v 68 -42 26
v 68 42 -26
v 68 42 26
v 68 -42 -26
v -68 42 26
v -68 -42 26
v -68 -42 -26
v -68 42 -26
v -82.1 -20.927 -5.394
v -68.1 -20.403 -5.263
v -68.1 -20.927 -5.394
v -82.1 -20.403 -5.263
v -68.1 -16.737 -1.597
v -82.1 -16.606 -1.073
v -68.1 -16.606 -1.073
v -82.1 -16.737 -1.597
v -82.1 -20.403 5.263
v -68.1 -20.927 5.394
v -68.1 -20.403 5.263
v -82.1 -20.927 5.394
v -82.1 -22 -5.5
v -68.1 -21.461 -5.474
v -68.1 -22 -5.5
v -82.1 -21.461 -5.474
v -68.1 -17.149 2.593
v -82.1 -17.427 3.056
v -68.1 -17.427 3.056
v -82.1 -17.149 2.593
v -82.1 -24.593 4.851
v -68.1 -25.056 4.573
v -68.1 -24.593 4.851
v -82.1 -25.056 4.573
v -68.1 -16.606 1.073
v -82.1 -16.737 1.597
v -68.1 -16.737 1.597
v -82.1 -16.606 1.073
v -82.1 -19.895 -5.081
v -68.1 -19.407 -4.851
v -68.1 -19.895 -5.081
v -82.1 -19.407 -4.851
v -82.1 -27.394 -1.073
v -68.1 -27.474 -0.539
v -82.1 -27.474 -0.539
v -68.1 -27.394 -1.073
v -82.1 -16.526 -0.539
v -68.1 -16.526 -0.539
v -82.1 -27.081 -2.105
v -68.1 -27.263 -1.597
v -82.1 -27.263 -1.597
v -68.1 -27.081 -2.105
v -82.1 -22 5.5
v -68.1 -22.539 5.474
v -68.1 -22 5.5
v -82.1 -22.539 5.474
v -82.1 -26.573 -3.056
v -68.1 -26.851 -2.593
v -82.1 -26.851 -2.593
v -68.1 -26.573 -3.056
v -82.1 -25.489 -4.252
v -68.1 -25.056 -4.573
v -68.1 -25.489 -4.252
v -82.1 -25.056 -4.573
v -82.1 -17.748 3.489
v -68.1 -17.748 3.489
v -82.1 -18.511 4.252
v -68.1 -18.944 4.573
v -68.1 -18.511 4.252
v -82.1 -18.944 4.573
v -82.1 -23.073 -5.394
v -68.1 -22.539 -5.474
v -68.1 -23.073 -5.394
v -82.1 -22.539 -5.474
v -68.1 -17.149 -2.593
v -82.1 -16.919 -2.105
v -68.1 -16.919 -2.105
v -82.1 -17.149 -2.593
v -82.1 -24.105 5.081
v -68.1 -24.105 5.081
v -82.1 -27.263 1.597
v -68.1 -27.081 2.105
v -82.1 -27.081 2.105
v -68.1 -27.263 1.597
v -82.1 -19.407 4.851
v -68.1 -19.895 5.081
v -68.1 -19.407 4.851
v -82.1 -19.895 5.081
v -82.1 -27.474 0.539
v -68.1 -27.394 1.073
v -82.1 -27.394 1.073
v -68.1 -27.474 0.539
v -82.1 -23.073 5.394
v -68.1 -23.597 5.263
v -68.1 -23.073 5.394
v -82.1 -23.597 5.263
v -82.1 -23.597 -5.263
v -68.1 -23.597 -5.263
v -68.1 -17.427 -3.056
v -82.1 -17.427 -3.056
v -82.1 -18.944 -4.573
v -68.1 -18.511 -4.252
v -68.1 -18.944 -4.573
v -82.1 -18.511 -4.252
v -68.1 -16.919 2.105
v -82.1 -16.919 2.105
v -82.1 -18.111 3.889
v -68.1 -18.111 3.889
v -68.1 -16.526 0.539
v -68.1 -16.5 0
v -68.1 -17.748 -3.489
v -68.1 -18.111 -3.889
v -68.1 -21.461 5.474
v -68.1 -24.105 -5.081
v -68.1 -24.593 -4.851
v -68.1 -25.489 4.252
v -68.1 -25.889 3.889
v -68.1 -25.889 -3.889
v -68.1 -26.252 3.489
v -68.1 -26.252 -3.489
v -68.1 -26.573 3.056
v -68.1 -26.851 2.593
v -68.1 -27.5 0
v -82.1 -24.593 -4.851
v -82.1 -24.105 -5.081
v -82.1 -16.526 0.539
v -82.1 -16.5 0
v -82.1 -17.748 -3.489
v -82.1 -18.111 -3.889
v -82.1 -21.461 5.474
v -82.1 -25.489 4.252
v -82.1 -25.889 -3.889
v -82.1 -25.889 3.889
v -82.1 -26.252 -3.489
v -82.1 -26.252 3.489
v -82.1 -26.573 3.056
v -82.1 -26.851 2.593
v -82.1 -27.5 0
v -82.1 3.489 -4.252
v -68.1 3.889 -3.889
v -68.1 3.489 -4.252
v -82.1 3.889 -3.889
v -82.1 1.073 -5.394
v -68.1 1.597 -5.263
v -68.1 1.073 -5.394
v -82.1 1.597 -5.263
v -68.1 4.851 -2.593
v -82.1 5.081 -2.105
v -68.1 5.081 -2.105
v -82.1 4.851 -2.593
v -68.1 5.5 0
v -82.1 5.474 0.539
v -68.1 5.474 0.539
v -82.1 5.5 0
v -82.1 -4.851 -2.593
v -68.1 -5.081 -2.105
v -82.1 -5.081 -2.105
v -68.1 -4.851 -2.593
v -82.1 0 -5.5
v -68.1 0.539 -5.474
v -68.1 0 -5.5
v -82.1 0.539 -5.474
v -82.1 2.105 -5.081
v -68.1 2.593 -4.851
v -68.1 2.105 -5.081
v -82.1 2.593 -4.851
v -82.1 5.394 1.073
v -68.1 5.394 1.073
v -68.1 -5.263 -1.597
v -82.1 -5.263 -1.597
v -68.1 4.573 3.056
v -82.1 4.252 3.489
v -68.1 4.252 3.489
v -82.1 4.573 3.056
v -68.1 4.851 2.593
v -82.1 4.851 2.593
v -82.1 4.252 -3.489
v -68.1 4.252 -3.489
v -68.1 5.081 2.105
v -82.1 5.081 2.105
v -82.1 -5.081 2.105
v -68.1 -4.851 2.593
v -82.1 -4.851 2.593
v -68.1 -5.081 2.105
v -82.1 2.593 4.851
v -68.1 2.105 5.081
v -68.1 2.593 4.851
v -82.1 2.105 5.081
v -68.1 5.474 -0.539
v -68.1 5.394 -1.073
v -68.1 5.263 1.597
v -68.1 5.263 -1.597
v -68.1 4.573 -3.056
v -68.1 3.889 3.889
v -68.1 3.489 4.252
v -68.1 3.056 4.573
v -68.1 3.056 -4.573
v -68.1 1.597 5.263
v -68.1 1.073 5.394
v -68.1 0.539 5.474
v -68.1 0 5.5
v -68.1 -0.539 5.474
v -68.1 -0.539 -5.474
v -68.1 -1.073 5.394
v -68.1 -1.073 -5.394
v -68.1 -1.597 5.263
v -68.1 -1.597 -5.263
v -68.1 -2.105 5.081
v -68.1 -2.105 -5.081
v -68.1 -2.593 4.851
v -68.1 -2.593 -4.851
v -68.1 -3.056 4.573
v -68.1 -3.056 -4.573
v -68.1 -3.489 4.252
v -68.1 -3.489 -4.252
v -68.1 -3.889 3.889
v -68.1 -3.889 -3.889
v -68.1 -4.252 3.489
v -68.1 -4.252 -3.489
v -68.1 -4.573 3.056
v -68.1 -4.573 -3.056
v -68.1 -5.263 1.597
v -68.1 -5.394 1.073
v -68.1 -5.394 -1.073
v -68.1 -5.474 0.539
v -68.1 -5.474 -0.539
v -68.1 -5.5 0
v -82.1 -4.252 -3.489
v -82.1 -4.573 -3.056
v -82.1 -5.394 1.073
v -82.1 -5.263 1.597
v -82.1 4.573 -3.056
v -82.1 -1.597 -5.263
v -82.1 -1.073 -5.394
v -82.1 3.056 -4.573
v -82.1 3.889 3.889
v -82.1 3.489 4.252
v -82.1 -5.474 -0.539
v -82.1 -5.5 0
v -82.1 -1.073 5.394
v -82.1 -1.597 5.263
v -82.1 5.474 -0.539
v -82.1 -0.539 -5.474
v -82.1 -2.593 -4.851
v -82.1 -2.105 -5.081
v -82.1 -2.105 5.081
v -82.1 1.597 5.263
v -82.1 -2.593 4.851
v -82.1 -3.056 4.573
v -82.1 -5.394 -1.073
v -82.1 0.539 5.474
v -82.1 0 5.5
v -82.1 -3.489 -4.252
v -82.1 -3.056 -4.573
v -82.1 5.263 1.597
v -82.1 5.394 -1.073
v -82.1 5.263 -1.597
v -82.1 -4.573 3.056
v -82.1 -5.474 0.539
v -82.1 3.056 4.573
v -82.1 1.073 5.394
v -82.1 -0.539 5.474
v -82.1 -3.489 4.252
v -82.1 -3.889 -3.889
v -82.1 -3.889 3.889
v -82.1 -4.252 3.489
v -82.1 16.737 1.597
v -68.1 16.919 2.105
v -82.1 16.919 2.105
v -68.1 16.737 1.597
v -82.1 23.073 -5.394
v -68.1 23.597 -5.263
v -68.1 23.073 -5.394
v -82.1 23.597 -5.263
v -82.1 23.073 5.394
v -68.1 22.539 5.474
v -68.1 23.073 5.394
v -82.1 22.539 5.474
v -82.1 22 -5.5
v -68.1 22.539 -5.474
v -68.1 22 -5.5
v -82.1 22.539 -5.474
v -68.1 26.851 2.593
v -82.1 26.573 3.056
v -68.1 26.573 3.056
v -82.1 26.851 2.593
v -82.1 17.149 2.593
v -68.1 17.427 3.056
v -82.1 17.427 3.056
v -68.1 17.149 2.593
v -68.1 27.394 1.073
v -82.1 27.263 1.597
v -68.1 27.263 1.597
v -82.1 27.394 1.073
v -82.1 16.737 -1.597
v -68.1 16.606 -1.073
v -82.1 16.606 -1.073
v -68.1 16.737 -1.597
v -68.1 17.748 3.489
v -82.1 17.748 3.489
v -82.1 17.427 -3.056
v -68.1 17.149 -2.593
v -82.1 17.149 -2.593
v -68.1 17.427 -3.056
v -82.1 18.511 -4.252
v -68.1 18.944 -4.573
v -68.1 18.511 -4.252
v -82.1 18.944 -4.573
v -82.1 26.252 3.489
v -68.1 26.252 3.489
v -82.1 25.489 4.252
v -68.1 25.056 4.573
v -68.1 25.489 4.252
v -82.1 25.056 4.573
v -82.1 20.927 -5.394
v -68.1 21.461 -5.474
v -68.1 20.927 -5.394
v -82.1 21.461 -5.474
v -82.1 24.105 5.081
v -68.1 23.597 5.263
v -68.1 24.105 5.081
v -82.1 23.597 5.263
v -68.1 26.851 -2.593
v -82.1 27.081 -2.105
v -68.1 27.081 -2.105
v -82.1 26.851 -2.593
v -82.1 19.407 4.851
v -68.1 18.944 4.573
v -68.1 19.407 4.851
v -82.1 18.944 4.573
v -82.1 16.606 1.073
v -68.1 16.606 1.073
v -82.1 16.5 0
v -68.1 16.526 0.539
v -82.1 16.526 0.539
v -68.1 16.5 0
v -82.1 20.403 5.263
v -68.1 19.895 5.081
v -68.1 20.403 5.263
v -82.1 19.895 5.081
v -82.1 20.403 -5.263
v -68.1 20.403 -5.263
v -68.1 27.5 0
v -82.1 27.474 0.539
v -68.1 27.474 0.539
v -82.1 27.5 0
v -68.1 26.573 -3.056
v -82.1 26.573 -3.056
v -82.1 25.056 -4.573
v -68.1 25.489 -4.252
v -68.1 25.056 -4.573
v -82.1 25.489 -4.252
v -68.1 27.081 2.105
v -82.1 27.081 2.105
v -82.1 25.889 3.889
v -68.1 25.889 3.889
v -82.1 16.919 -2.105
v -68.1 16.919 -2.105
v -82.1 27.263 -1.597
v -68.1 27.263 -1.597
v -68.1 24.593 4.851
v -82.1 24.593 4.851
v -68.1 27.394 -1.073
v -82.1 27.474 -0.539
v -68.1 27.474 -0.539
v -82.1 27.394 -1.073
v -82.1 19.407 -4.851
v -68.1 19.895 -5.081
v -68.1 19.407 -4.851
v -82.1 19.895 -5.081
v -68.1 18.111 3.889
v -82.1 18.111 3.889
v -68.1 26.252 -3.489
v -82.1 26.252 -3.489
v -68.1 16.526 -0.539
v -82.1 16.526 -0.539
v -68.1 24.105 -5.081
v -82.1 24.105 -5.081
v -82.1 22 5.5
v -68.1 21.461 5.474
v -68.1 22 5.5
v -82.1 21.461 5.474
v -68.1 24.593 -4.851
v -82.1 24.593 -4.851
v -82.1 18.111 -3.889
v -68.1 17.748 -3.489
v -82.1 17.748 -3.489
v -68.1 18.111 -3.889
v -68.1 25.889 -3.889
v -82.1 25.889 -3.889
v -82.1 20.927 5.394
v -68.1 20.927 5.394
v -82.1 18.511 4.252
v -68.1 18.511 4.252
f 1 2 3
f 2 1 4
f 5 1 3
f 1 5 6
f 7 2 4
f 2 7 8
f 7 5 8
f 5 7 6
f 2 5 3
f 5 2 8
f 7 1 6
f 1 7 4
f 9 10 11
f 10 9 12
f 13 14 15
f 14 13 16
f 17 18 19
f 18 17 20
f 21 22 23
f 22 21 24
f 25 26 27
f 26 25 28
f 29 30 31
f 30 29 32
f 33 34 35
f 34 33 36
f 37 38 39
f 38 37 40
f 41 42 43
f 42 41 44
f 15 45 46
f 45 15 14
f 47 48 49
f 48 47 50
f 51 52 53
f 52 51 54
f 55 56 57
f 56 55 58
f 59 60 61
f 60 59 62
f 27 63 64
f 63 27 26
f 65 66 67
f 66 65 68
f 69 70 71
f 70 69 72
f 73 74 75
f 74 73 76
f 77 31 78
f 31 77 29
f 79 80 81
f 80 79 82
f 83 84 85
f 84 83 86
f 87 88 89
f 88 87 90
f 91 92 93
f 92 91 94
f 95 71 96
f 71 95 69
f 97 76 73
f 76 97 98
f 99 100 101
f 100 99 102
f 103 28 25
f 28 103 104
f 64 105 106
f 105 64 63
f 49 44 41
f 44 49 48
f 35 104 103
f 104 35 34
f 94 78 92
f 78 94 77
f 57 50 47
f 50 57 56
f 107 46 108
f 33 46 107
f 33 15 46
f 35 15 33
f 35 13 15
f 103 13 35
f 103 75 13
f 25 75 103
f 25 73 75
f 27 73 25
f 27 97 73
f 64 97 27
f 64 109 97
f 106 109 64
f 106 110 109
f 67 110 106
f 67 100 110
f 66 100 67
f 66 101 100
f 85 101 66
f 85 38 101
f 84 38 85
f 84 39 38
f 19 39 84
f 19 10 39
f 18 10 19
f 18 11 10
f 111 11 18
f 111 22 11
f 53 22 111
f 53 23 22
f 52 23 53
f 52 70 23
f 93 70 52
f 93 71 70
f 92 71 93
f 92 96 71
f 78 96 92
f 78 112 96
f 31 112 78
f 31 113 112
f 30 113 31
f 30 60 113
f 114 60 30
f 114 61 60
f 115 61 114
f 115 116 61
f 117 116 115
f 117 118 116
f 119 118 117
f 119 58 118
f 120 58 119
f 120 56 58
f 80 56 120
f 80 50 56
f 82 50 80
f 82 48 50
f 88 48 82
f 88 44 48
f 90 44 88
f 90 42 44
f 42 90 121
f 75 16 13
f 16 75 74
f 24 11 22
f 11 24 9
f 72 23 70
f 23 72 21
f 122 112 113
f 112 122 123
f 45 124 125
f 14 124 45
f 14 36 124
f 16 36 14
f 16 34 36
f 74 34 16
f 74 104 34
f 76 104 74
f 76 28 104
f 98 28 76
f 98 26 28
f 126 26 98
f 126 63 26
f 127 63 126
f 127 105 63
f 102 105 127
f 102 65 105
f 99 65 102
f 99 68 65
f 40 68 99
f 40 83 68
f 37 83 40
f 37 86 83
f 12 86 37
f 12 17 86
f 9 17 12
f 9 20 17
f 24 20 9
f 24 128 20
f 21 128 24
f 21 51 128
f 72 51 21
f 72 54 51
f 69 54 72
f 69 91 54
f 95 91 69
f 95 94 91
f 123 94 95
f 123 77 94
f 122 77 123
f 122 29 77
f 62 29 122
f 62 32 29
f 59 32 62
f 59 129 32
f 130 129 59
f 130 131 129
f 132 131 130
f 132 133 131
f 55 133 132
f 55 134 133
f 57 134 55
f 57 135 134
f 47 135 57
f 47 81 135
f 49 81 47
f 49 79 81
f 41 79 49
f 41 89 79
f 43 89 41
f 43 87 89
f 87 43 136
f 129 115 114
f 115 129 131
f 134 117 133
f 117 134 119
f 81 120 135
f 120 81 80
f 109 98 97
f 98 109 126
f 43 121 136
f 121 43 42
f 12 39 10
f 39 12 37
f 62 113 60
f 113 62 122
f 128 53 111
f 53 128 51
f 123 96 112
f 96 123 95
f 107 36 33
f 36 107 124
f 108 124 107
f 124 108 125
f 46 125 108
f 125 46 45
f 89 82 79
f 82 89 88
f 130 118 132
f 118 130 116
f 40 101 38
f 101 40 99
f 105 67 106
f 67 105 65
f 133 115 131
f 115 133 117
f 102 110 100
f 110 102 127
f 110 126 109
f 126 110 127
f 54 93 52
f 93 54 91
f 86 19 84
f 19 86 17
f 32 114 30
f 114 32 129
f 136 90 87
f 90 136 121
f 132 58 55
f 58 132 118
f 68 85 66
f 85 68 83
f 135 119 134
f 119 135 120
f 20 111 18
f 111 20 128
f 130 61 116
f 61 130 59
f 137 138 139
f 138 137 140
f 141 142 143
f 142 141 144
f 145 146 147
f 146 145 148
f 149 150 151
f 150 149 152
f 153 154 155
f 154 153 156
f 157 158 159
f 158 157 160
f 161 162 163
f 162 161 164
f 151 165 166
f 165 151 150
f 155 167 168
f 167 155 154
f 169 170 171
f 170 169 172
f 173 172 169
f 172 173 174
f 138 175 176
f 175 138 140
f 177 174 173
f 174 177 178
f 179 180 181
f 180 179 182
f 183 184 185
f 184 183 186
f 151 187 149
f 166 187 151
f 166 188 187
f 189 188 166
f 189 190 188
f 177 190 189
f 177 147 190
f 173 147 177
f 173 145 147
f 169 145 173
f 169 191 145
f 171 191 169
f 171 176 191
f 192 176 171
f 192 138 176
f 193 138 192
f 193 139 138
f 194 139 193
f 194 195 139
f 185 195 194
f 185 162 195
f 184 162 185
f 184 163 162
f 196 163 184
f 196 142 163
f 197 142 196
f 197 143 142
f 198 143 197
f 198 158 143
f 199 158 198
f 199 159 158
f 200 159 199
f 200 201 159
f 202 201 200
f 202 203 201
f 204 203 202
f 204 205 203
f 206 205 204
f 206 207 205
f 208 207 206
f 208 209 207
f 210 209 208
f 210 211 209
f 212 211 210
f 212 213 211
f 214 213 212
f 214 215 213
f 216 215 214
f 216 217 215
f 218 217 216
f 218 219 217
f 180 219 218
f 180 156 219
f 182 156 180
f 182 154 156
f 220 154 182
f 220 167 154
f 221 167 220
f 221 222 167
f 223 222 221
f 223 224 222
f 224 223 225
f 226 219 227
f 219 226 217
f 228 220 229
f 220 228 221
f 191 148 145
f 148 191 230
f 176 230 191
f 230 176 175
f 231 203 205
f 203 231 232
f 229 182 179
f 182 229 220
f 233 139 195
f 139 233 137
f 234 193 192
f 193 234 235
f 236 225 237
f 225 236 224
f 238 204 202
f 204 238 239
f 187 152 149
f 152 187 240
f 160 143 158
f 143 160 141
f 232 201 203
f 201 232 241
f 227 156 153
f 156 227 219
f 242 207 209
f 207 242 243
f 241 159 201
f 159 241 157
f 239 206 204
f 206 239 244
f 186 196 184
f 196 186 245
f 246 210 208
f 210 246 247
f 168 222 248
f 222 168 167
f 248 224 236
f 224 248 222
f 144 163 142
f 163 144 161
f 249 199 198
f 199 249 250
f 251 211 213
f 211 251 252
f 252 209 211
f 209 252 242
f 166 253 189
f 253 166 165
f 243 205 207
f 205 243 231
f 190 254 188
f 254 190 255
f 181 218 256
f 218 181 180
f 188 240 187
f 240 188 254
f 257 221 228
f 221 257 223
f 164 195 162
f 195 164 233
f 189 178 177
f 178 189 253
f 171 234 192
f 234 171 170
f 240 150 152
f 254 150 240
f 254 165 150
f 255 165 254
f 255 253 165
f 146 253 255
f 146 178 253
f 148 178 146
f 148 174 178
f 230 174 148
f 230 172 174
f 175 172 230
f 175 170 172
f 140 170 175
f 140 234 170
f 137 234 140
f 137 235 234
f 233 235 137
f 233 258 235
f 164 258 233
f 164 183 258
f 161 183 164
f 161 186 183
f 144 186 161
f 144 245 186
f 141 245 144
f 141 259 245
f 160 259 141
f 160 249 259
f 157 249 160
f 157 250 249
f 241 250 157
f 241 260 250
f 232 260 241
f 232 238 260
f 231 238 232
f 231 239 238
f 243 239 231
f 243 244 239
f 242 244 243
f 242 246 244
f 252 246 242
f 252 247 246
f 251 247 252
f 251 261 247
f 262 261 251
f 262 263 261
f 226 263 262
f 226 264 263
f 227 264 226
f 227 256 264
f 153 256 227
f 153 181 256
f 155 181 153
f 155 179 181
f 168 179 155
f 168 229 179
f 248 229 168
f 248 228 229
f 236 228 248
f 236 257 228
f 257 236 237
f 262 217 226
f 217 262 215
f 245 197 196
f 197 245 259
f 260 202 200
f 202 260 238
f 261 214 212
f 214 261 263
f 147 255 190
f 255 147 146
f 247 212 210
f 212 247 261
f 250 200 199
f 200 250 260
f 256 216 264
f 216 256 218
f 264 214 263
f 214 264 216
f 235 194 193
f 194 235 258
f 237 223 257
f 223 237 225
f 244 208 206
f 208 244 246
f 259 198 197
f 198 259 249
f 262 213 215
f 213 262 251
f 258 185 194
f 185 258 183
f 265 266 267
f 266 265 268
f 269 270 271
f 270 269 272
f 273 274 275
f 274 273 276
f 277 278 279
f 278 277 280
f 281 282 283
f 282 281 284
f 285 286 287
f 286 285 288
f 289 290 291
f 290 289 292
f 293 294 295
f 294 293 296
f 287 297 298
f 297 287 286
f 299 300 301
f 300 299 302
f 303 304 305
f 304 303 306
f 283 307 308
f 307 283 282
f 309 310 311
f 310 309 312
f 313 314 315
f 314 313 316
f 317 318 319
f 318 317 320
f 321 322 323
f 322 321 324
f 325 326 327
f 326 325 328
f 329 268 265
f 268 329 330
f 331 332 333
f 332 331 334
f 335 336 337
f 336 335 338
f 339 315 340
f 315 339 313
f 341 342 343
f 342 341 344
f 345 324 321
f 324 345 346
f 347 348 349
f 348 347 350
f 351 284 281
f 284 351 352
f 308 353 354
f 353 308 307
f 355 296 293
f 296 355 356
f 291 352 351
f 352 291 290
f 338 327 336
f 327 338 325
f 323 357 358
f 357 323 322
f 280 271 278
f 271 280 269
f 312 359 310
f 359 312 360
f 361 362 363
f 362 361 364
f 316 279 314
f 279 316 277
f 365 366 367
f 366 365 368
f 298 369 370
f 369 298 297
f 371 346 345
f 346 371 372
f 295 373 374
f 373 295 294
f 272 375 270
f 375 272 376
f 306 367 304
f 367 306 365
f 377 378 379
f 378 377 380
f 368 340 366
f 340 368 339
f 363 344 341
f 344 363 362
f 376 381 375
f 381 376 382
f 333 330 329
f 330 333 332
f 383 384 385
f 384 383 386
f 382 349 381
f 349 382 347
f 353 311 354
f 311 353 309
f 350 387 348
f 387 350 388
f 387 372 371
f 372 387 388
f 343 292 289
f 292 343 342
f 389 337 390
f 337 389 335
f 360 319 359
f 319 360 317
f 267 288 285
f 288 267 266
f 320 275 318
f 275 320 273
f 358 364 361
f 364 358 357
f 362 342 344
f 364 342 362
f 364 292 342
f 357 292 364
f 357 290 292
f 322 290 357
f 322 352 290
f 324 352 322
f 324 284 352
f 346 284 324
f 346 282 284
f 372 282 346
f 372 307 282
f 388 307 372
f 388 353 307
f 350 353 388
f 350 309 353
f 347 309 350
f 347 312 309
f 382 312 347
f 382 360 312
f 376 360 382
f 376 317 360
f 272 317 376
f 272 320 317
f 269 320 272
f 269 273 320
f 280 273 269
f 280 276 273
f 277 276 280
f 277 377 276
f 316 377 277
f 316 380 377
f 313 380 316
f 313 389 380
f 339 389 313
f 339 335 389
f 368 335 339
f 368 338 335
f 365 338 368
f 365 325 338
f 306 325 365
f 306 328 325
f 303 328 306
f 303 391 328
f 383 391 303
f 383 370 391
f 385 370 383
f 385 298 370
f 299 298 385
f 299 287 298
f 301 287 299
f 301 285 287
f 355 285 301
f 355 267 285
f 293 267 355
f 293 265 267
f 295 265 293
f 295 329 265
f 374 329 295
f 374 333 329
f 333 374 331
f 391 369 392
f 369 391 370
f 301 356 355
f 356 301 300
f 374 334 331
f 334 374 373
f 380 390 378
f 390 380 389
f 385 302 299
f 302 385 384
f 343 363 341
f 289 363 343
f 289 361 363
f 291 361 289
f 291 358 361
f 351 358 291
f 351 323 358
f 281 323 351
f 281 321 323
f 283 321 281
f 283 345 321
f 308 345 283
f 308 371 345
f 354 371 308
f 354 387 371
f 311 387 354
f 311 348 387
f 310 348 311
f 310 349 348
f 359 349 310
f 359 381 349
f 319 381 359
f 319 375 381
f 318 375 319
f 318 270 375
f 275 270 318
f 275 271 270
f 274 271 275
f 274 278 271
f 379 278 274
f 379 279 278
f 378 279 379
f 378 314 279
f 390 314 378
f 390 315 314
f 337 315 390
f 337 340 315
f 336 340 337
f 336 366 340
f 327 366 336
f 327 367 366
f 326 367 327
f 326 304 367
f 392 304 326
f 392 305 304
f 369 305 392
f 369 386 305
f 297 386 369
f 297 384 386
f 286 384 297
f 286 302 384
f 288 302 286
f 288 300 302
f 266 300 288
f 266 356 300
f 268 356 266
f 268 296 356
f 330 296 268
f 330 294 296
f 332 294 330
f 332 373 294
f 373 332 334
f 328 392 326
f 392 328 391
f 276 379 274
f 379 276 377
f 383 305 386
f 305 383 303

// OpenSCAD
// ============================================================================
// Atom Lithography Machine — Parametric OpenSCAD Module (S4.4-01)
// ============================================================================
// part_id           : S4.4-01
// parent_bom_id     : S4.4
// subsystem         : S4
// part_name         : 3-eksenli frekans-kararli He-Ne lazer interferometre kafasi (Renishaw XL-80/RLE)
// material          : Al 6061
// temp_stage        : 300 K
// vacuum_grade      : Atmosfer (fiber cikiş)
// tolerance         : ±0.05 ppm
// computed_mass_kg  : 1.30534
// envelope_mm       : 162.200 x 84.000 x 65.800
// design_maturity   : M0_M1_DETAILED_CAD_DESIGN_ONLY
// no_lab_measurement: true
// iec61508_certified: false
// semi_s2_certified : false
// Units: millimeters (mm)
// ============================================================================

$fn = 64;

// Nominal bounding envelope parameters (mm)
bbox_x = 162.2000;
bbox_y = 84.0000;
bbox_z = 65.8000;

// Part-specific parametric dimensions
wavelength_nm = 632.8;
freq_stab_ppm = 0.05;
n_fiber_axes = 3;

// Interface / port parameters (mm)

module part_S4_4_01() {
  union() {
    // Stabilized 632.8 nm He-Ne laser unit (Renishaw XL-80/RLE)
    cube([136.000, 84.000, 52.000], center=true);
    // FC/APC Fiber Launch X
    translate([-75.100, -22.000, 0.000]) rotate([0.000, 90.000, 0.000]) cylinder(d=11.000, h=14.000, center=true);
    // FC/APC Fiber Launch Y
    translate([-75.100, 0.000, 0.000]) rotate([0.000, 90.000, 0.000]) cylinder(d=11.000, h=14.000, center=true);
    // FC/APC Fiber Launch Z
    translate([-75.100, 22.000, 0.000]) rotate([0.000, 90.000, 0.000]) cylinder(d=11.000, h=14.000, center=true);
  }
}

// World assembly mounting transform (global machine frame, mm / deg):
// translate([330.000, 245.000, -205.000]) rotate([0.000, 0.000, 0.000]) part_S4_4_01();

part_S4_4_01();
